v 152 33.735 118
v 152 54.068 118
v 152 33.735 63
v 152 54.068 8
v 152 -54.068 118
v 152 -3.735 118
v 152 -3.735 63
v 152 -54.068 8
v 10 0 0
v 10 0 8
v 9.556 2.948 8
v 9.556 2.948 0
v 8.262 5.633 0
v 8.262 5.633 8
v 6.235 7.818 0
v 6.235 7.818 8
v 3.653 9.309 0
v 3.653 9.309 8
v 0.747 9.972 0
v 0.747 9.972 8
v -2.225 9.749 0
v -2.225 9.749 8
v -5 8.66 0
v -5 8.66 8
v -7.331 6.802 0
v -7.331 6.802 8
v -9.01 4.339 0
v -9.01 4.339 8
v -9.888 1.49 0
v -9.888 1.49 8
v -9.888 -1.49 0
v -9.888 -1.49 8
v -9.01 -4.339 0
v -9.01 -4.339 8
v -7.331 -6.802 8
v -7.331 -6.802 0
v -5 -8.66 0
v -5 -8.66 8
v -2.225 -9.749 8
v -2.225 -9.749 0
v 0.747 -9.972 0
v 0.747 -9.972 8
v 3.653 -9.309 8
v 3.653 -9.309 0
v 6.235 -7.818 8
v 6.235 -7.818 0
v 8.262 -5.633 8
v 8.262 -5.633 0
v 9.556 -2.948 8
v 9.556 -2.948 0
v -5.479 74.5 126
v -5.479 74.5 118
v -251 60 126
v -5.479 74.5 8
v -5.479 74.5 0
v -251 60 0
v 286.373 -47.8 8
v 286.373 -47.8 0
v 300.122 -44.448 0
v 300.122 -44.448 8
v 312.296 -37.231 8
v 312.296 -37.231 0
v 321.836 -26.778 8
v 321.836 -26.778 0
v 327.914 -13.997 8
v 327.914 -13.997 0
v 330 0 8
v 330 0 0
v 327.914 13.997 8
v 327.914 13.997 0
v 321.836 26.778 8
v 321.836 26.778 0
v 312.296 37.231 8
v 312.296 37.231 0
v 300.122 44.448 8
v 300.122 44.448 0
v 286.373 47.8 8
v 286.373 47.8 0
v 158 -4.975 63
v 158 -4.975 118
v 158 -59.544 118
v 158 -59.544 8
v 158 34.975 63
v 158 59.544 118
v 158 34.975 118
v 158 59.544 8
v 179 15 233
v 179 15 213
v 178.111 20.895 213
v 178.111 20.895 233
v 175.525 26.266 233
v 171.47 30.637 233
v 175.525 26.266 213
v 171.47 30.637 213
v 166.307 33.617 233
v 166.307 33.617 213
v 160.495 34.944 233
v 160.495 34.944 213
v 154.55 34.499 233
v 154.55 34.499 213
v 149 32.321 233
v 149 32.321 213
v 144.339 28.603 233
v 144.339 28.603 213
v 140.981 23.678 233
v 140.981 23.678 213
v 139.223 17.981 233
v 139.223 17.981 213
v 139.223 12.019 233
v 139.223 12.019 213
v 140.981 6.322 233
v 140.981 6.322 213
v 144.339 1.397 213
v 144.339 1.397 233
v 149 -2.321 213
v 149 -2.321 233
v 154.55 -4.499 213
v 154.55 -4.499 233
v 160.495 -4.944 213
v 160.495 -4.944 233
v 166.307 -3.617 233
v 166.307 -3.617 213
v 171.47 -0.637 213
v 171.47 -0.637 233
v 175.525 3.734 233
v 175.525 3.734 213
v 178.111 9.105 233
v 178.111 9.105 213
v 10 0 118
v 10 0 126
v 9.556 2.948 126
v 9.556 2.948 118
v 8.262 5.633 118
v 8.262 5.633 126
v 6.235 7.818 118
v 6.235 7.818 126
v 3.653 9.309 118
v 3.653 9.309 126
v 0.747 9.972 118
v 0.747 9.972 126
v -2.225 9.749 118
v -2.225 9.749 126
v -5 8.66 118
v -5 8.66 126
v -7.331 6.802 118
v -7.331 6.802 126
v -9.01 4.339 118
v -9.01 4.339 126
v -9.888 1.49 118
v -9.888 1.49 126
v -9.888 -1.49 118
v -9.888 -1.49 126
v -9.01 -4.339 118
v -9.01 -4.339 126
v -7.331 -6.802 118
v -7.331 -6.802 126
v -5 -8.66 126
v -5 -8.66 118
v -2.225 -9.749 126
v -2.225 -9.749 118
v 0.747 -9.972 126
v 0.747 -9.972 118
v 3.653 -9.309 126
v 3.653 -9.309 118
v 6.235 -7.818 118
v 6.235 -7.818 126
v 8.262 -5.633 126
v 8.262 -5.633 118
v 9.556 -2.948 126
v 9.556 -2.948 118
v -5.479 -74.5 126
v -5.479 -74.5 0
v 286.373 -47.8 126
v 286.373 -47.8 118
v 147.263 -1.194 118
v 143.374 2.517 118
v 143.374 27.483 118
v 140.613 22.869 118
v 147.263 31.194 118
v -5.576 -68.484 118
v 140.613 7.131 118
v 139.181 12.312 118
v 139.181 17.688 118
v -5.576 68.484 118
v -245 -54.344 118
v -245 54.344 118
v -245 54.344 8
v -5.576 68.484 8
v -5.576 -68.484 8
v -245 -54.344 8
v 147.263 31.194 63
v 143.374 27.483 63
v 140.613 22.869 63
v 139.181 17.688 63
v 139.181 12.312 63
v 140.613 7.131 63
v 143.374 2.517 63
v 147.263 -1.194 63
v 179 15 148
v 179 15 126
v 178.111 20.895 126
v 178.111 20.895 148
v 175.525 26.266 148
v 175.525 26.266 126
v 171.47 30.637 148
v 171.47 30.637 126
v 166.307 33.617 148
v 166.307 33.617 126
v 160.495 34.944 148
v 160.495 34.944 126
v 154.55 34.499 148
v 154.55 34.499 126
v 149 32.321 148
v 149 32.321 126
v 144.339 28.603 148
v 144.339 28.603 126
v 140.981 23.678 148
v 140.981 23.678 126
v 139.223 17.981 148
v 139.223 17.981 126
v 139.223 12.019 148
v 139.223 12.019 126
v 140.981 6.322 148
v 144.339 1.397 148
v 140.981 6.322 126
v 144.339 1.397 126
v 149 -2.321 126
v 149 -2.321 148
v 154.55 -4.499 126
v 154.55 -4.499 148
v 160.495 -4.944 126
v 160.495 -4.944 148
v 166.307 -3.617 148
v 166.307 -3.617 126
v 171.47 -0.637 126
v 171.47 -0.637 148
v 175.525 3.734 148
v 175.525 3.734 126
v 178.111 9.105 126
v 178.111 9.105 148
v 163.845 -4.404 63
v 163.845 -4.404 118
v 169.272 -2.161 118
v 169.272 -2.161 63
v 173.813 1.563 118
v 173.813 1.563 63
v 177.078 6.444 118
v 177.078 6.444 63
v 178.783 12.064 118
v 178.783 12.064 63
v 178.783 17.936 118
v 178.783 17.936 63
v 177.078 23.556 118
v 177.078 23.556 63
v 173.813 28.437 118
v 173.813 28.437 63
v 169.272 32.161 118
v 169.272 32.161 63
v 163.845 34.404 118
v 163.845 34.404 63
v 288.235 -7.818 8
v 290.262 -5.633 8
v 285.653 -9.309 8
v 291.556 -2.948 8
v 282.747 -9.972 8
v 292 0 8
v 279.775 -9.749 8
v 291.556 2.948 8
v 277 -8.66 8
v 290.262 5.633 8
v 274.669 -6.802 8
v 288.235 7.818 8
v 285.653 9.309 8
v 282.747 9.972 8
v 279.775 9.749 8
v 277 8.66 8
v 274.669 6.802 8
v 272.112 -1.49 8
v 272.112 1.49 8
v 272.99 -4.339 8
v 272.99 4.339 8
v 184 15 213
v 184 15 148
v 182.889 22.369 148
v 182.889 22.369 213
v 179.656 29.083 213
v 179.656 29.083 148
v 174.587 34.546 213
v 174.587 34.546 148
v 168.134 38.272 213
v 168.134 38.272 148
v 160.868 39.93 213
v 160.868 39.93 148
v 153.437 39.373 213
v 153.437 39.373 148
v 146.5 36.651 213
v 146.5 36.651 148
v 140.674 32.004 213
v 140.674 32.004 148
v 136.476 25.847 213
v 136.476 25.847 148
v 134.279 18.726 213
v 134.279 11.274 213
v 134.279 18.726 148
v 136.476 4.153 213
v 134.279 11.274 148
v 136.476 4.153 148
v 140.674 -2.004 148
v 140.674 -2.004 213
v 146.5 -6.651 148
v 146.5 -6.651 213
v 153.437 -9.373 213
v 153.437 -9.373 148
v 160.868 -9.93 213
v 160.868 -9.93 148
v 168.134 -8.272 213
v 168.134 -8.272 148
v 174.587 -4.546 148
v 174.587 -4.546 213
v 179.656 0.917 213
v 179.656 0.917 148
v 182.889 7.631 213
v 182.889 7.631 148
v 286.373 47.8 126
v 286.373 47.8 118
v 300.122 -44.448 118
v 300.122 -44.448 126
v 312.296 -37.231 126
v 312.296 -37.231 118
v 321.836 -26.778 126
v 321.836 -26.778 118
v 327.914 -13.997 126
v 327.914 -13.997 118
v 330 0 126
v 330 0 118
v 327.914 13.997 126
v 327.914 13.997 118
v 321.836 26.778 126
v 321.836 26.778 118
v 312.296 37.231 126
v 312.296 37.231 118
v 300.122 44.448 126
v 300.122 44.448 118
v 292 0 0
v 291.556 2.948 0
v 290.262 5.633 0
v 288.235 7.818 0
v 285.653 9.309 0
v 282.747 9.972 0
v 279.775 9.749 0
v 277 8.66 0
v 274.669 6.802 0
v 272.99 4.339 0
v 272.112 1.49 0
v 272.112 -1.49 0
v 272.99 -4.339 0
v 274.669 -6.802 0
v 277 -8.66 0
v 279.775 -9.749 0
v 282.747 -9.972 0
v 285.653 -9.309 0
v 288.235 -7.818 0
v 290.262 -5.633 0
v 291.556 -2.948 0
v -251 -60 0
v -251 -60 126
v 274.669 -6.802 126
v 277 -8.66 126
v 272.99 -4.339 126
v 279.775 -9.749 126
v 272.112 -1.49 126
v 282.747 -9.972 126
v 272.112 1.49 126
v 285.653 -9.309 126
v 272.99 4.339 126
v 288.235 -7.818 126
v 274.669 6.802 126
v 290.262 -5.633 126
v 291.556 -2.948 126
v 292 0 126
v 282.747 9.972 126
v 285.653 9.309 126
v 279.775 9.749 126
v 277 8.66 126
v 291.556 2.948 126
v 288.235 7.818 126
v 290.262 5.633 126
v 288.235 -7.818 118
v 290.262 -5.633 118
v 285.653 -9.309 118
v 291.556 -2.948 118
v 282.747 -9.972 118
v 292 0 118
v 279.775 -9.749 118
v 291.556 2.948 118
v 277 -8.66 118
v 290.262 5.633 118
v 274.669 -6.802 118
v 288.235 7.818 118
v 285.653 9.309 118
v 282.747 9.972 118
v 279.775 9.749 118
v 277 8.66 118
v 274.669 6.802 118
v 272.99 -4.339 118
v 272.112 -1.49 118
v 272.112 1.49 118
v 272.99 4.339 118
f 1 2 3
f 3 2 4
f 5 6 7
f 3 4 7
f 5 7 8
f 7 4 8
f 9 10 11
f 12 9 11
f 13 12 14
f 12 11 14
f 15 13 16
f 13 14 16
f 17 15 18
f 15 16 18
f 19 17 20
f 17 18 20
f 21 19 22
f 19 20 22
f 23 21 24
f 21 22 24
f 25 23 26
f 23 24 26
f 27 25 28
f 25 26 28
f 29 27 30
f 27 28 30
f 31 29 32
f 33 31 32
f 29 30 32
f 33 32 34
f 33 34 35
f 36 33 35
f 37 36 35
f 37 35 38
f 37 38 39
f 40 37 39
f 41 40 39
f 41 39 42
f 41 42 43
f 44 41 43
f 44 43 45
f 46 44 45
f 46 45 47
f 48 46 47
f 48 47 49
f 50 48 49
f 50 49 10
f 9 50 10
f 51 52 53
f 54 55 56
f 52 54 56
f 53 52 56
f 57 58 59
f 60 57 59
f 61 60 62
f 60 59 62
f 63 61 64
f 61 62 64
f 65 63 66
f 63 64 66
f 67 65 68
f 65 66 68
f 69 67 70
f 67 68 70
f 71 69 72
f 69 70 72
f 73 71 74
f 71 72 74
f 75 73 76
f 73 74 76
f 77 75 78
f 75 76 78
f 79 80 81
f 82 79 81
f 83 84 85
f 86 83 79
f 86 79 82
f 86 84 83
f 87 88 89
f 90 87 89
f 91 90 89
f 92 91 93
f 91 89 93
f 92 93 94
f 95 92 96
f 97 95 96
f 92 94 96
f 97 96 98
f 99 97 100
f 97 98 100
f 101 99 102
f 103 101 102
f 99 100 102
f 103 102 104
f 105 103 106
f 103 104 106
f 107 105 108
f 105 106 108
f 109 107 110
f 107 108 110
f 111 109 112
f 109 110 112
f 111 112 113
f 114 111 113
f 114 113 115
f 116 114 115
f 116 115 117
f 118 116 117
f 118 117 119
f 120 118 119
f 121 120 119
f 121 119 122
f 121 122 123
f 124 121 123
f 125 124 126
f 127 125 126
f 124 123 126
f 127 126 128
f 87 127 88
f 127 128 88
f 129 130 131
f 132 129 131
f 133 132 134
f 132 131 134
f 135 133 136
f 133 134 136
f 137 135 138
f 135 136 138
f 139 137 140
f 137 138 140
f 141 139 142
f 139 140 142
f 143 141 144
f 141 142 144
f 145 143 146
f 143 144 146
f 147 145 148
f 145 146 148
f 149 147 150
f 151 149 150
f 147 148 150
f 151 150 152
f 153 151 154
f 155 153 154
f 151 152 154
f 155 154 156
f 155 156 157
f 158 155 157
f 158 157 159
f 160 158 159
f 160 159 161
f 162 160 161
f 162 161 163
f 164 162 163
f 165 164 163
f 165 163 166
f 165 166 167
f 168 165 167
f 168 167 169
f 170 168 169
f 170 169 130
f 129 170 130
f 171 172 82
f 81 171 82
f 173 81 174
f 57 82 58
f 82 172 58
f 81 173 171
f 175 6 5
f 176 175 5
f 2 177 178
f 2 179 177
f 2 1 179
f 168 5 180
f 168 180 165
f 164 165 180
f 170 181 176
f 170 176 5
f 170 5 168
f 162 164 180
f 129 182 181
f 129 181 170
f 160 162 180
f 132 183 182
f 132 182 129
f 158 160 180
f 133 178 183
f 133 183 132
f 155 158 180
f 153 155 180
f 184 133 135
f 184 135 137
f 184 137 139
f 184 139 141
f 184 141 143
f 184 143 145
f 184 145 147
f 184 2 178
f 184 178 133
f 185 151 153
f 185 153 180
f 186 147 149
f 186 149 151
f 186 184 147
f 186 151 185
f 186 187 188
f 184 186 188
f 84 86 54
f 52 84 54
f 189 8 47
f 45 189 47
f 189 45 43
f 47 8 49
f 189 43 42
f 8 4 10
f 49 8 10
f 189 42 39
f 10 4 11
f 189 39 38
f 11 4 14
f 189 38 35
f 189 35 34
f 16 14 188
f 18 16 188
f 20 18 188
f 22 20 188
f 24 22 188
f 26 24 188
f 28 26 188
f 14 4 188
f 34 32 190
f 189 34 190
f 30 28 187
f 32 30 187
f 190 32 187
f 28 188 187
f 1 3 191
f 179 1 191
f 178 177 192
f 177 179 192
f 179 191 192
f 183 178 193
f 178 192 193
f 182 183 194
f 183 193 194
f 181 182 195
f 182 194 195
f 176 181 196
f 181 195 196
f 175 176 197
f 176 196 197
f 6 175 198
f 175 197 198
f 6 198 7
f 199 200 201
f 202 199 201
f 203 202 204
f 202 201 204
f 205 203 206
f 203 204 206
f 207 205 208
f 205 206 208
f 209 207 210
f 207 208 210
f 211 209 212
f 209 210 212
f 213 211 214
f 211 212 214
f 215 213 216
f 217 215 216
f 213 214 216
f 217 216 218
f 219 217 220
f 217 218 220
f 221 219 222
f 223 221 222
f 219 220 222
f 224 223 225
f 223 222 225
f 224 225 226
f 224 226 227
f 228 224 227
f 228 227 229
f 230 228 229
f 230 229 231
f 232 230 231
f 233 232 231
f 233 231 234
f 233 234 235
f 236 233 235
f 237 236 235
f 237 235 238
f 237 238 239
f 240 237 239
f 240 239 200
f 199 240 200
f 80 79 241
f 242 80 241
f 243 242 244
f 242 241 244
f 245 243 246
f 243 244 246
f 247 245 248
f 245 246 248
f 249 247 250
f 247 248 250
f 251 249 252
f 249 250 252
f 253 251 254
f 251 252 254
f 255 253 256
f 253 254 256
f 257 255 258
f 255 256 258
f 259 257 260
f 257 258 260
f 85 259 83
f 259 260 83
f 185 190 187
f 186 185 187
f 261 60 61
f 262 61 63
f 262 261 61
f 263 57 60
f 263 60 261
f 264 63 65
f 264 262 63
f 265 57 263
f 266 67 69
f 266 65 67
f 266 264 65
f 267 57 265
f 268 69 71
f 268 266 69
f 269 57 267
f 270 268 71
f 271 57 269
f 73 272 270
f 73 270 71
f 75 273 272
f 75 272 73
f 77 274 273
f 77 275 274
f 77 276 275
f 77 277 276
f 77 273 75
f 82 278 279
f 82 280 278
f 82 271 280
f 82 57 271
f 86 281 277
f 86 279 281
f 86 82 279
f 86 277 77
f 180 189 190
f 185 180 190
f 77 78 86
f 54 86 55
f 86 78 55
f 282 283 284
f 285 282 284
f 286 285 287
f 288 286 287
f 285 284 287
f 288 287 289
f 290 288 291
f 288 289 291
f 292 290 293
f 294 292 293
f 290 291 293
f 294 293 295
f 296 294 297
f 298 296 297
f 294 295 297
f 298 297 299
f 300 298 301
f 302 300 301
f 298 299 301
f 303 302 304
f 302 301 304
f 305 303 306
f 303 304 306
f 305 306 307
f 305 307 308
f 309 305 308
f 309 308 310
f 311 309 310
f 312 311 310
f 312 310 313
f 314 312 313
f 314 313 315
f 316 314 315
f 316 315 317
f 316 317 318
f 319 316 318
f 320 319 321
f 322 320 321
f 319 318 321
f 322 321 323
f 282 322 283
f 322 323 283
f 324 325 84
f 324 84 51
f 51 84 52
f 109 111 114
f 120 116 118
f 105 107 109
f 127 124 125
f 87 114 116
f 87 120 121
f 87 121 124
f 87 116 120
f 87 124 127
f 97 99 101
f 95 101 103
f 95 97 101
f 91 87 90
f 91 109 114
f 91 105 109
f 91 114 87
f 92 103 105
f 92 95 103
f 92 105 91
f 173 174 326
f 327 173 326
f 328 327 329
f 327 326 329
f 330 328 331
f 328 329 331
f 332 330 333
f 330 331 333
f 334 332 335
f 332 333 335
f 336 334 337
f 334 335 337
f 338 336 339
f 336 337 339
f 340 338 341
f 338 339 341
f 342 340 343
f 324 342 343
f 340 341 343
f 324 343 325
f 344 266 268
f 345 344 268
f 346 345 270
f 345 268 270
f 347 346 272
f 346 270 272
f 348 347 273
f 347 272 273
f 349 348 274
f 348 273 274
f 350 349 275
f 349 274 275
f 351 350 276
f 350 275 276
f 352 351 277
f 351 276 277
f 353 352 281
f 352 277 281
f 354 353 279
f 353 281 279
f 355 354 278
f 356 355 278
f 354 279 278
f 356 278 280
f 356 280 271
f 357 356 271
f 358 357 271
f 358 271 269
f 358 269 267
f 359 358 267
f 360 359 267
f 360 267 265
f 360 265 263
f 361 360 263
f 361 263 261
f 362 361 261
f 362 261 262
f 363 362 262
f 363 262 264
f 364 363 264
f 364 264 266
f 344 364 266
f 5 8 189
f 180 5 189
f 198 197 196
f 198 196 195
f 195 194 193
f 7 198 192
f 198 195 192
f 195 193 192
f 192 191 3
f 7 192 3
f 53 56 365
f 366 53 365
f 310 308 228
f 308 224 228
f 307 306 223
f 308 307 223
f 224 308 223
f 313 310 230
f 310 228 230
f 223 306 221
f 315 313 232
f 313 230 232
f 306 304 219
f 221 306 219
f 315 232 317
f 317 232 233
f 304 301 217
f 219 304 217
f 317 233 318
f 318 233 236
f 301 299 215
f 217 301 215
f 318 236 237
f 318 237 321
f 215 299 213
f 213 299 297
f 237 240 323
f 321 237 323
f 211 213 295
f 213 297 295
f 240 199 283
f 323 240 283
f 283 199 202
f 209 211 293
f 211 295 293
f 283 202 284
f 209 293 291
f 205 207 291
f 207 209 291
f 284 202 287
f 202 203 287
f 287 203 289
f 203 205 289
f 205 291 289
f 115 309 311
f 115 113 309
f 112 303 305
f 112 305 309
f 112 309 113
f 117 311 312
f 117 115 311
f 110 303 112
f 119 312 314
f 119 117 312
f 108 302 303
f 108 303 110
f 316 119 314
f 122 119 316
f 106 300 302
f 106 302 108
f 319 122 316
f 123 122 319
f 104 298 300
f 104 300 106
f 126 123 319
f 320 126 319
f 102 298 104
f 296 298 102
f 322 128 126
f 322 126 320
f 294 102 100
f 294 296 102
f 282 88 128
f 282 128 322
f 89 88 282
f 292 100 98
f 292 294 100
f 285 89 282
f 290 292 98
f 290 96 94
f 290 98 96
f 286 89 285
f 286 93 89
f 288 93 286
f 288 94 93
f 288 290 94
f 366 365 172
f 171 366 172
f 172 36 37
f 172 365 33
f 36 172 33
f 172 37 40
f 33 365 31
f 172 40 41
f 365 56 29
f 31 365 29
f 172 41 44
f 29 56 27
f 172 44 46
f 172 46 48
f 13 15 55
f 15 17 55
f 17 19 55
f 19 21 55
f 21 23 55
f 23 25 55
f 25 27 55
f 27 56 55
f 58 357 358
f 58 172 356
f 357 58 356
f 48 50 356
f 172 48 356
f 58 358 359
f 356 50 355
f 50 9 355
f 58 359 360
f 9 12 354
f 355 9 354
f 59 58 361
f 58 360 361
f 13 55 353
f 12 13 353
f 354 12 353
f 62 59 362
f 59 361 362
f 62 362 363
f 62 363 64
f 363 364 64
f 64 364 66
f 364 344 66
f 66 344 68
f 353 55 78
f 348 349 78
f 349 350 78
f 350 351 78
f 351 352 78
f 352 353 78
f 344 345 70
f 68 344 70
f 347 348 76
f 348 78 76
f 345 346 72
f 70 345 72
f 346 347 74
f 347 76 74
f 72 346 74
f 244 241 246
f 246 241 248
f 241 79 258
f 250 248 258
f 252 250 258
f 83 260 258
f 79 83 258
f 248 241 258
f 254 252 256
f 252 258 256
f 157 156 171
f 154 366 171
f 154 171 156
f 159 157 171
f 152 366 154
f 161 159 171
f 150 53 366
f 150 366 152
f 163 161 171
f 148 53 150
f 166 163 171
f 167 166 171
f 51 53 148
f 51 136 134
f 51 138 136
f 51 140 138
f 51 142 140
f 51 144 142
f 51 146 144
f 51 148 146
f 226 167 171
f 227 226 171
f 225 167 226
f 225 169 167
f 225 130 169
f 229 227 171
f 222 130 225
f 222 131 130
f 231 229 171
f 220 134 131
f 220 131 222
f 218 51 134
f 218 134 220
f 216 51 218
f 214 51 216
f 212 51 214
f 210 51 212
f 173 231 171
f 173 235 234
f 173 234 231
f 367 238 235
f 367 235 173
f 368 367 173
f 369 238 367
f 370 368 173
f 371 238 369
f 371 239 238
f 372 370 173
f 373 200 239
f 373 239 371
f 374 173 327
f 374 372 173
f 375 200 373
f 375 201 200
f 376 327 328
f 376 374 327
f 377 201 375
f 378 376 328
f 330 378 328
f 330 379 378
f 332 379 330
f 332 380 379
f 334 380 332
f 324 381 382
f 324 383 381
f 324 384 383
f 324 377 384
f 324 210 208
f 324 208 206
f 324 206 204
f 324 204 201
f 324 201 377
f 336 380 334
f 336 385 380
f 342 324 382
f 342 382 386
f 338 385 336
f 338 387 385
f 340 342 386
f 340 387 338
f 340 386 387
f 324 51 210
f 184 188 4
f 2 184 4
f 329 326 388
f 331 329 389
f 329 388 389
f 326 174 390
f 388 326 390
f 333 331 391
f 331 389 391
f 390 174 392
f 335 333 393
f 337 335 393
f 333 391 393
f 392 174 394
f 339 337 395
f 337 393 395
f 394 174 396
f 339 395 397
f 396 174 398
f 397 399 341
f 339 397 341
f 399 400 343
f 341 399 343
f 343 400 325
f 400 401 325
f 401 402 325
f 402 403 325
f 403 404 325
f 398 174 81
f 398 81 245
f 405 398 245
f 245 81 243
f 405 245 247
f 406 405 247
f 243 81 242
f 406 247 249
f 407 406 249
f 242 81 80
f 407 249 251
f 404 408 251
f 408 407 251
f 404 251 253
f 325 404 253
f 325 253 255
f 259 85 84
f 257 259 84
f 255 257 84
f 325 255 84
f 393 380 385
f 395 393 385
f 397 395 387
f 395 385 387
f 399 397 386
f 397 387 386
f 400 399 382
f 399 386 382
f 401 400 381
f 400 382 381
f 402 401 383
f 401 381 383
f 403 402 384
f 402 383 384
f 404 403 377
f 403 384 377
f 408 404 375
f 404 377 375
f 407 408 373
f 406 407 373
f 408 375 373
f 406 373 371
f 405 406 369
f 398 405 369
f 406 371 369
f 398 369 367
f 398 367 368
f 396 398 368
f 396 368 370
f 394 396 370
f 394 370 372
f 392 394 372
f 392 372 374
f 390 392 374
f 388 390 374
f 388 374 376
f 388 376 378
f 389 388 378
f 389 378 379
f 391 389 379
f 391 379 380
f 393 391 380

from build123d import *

# Parameters (mm, degrees)
EXTRUSION1_DEPTH             = 126
ESQUISSE2_W                  = 110
ESQUISSE2_H                  = 140
ENL_V_MAT_EXTRU_1_DEPTH      = 200
ENL_V_MAT_EXTRU_2_DEPTH      = 55
ENL_V_MAT_EXTRU_2_DEPTH_BACK = 55
ESQUISSE6_OUTSIDE_W          = 705.578
ESQUISSE6_OUTSIDE_H          = 273.578
ESQUISSE8_R                  = 20
EXTRUSION2_DEPTH             = 85
ESQUISSE9_R                  = 25
EXTRUSION3_DEPTH             = 65
ESQUISSE10_R                 = 20
EXTRUSION4_DEPTH             = 20
ESQUISSE11_R                 = 10
ENL_V_MAT_EXTRU_3_DEPTH      = 362.007271395
ESQUISSE12_R                 = 10
ENL_V_MAT_EXTRU_4_DEPTH      = 362.007271395


with BuildPart() as part:
    # Esquisse1 → Extrusion1 (new body)
    with BuildSketch(Plane.XY):
        with BuildLine():
            Line((-251, 60), (-251, -60))
            Line((-251, -60), (-5.478634649, -74.5))
            Line((-5.478634649, -74.5), (286.372947888, -47.800390446))
            ThreePointArc((286.372947888, -47.800390446), (330, 0), (286.372947888, 47.800390446))
            Line((286.372947888, 47.800390446), (-5.478634649, 74.5))
            Line((-5.478634649, 74.5), (-251, 60))
        make_face()
    extrude(amount=EXTRUSION1_DEPTH)

    # Esquisse2 → Enlèv. mat.-Extru.1 (cut)
    with BuildSketch(Plane(origin=(158, 0, 0), x_dir=(0, 0, -1), z_dir=(1, 0, 0))):
        with Locations((-63, -30)):
            Rectangle(ESQUISSE2_W, ESQUISSE2_H)
    extrude(amount=ENL_V_MAT_EXTRU_1_DEPTH, mode=Mode.SUBTRACT)

    # Esquisse6 outside → Enlèv. mat.-Extru.2 (cut, two sides: drawn at the far end of the back side and taken through both)
    # profile 1 of 2: a face of its own
    with BuildSketch(Plane.XY.offset(63).offset(-ENL_V_MAT_EXTRU_2_DEPTH_BACK)):
        with Locations((39.5, 0)):
            Rectangle(ESQUISSE6_OUTSIDE_W, ESQUISSE6_OUTSIDE_H)
        Polygon((-251, 60), (-251, -60), (-5.478634649, -74.5), (158, -59.544399357), (158, 59.544399357), (-5.478634649, 74.5), align=None, mode=Mode.SUBTRACT)
    # profile 2 of 2: a face of its own
    with BuildSketch(Plane.XY.offset(63).offset(-ENL_V_MAT_EXTRU_2_DEPTH_BACK)):
        Polygon((152, 54.068245078), (152, -54.068245078), (-5.575624206, -68.483817558), (-245, -54.343893548), (-245, 54.343893548), (-5.575624206, 68.483817558), align=None)
    extrude(amount=ENL_V_MAT_EXTRU_2_DEPTH + ENL_V_MAT_EXTRU_2_DEPTH_BACK, mode=Mode.SUBTRACT)

    # Esquisse8 → Extrusion2 (add)
    with BuildSketch(Plane.XY.offset(63)):
        with Locations((159, 15)):
            Circle(ESQUISSE8_R)
    extrude(amount=EXTRUSION2_DEPTH)

    # Esquisse9 → Extrusion3 (add)
    with BuildSketch(Plane.XY.offset(148)):
        with Locations((159, 15)):
            Circle(ESQUISSE9_R)
    extrude(amount=EXTRUSION3_DEPTH)

    # Esquisse10 → Extrusion4 (add)
    with BuildSketch(Plane.XY.offset(213)):
        with Locations((159, 15)):
            Circle(ESQUISSE10_R)
    extrude(amount=EXTRUSION4_DEPTH)

    # Esquisse11 → Enlèv. mat.-Extru.3 (cut, through all)
    with BuildSketch(Plane.XY.offset(126)):
        with Locations((282, 0)):
            Circle(ESQUISSE11_R)
    extrude(amount=-ENL_V_MAT_EXTRU_3_DEPTH, mode=Mode.SUBTRACT)

    # Esquisse12 → Enlèv. mat.-Extru.4 (cut, through all)
    with BuildSketch(Plane.XY.offset(126)):
        Circle(ESQUISSE12_R)
    extrude(amount=-ENL_V_MAT_EXTRU_4_DEPTH, mode=Mode.SUBTRACT)


solid = part.part
